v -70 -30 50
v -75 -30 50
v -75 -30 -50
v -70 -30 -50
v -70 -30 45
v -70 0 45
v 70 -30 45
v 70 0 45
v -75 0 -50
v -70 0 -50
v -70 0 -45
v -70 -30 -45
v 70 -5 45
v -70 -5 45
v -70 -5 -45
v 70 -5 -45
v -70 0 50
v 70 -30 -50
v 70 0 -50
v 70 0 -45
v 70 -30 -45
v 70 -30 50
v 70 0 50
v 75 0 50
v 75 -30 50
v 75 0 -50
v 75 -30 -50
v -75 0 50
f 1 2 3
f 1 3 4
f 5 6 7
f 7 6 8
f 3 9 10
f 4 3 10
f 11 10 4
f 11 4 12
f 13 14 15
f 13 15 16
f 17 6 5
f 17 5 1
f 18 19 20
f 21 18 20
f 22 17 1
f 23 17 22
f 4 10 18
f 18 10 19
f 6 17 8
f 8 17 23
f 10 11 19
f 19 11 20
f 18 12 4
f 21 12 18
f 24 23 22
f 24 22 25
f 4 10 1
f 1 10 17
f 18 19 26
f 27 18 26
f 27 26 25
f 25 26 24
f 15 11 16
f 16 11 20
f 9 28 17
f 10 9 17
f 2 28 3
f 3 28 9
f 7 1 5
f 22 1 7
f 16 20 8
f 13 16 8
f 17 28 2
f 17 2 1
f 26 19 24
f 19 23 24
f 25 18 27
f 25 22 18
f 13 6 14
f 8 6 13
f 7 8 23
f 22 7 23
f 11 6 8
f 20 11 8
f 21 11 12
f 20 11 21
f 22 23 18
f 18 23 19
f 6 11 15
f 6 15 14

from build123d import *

# Parameters (mm, degrees)
F0_W     = 140
F0_H     = 90
F1_DEPTH = 5
F0_W_2   = 5
F0_H_2   = 5
F2_DEPTH = 30
F3_DEPTH = 30
F4_DEPTH = 30
F5_DEPTH = 30


# Not quite as in the source:
# - a feature of the source that left no trace in its solid (it failed there, or was rolled back) is left out


with BuildPart() as f1:
    # F0 (on Front) → F1 (new body)
    with BuildSketch(Plane.XZ):
        Rectangle(F0_W, F0_H)
    extrude(amount=F1_DEPTH)


with BuildPart() as f2:
    # F0 (on Front) → F2 (new body)
    with BuildSketch(Plane.XZ):
        with Locations((-72.5, 0)):
            Rectangle(F0_W_2, F0_H)
        with Locations((-72.5, 47.5)):
            Rectangle(F0_W_2, F0_H_2)
        with Locations((-72.5, -47.5)):
            Rectangle(F0_W_2, F0_H_2)
    extrude(amount=F2_DEPTH)


with BuildPart() as f3:
    # F0 (on Front) → F3 (new body)
    with BuildSketch(Plane.XZ):
        with Locations((72.5, 0)):
            Rectangle(F0_W_2, F0_H)
        with Locations((72.5, -47.5)):
            Rectangle(F0_W_2, F0_H_2)
        with Locations((72.5, 47.5)):
            Rectangle(F0_W_2, F0_H_2)
    extrude(amount=F3_DEPTH)


with BuildPart() as f4:
    # F0 (on Front) → F4 (new body)
    with BuildSketch(Plane.XZ):
        with Locations((0, 47.5)):
            Rectangle(F0_W, F0_H_2)
    extrude(amount=F4_DEPTH)


with BuildPart() as f5:
    # F0 (on Front) → F5 (new body)
    with BuildSketch(Plane.XZ):
        with Locations((0, -47.5)):
            Rectangle(F0_W, F0_H_2)
    extrude(amount=F5_DEPTH)


solid = Compound([f1.part, f2.part, f3.part, f4.part, f5.part])
